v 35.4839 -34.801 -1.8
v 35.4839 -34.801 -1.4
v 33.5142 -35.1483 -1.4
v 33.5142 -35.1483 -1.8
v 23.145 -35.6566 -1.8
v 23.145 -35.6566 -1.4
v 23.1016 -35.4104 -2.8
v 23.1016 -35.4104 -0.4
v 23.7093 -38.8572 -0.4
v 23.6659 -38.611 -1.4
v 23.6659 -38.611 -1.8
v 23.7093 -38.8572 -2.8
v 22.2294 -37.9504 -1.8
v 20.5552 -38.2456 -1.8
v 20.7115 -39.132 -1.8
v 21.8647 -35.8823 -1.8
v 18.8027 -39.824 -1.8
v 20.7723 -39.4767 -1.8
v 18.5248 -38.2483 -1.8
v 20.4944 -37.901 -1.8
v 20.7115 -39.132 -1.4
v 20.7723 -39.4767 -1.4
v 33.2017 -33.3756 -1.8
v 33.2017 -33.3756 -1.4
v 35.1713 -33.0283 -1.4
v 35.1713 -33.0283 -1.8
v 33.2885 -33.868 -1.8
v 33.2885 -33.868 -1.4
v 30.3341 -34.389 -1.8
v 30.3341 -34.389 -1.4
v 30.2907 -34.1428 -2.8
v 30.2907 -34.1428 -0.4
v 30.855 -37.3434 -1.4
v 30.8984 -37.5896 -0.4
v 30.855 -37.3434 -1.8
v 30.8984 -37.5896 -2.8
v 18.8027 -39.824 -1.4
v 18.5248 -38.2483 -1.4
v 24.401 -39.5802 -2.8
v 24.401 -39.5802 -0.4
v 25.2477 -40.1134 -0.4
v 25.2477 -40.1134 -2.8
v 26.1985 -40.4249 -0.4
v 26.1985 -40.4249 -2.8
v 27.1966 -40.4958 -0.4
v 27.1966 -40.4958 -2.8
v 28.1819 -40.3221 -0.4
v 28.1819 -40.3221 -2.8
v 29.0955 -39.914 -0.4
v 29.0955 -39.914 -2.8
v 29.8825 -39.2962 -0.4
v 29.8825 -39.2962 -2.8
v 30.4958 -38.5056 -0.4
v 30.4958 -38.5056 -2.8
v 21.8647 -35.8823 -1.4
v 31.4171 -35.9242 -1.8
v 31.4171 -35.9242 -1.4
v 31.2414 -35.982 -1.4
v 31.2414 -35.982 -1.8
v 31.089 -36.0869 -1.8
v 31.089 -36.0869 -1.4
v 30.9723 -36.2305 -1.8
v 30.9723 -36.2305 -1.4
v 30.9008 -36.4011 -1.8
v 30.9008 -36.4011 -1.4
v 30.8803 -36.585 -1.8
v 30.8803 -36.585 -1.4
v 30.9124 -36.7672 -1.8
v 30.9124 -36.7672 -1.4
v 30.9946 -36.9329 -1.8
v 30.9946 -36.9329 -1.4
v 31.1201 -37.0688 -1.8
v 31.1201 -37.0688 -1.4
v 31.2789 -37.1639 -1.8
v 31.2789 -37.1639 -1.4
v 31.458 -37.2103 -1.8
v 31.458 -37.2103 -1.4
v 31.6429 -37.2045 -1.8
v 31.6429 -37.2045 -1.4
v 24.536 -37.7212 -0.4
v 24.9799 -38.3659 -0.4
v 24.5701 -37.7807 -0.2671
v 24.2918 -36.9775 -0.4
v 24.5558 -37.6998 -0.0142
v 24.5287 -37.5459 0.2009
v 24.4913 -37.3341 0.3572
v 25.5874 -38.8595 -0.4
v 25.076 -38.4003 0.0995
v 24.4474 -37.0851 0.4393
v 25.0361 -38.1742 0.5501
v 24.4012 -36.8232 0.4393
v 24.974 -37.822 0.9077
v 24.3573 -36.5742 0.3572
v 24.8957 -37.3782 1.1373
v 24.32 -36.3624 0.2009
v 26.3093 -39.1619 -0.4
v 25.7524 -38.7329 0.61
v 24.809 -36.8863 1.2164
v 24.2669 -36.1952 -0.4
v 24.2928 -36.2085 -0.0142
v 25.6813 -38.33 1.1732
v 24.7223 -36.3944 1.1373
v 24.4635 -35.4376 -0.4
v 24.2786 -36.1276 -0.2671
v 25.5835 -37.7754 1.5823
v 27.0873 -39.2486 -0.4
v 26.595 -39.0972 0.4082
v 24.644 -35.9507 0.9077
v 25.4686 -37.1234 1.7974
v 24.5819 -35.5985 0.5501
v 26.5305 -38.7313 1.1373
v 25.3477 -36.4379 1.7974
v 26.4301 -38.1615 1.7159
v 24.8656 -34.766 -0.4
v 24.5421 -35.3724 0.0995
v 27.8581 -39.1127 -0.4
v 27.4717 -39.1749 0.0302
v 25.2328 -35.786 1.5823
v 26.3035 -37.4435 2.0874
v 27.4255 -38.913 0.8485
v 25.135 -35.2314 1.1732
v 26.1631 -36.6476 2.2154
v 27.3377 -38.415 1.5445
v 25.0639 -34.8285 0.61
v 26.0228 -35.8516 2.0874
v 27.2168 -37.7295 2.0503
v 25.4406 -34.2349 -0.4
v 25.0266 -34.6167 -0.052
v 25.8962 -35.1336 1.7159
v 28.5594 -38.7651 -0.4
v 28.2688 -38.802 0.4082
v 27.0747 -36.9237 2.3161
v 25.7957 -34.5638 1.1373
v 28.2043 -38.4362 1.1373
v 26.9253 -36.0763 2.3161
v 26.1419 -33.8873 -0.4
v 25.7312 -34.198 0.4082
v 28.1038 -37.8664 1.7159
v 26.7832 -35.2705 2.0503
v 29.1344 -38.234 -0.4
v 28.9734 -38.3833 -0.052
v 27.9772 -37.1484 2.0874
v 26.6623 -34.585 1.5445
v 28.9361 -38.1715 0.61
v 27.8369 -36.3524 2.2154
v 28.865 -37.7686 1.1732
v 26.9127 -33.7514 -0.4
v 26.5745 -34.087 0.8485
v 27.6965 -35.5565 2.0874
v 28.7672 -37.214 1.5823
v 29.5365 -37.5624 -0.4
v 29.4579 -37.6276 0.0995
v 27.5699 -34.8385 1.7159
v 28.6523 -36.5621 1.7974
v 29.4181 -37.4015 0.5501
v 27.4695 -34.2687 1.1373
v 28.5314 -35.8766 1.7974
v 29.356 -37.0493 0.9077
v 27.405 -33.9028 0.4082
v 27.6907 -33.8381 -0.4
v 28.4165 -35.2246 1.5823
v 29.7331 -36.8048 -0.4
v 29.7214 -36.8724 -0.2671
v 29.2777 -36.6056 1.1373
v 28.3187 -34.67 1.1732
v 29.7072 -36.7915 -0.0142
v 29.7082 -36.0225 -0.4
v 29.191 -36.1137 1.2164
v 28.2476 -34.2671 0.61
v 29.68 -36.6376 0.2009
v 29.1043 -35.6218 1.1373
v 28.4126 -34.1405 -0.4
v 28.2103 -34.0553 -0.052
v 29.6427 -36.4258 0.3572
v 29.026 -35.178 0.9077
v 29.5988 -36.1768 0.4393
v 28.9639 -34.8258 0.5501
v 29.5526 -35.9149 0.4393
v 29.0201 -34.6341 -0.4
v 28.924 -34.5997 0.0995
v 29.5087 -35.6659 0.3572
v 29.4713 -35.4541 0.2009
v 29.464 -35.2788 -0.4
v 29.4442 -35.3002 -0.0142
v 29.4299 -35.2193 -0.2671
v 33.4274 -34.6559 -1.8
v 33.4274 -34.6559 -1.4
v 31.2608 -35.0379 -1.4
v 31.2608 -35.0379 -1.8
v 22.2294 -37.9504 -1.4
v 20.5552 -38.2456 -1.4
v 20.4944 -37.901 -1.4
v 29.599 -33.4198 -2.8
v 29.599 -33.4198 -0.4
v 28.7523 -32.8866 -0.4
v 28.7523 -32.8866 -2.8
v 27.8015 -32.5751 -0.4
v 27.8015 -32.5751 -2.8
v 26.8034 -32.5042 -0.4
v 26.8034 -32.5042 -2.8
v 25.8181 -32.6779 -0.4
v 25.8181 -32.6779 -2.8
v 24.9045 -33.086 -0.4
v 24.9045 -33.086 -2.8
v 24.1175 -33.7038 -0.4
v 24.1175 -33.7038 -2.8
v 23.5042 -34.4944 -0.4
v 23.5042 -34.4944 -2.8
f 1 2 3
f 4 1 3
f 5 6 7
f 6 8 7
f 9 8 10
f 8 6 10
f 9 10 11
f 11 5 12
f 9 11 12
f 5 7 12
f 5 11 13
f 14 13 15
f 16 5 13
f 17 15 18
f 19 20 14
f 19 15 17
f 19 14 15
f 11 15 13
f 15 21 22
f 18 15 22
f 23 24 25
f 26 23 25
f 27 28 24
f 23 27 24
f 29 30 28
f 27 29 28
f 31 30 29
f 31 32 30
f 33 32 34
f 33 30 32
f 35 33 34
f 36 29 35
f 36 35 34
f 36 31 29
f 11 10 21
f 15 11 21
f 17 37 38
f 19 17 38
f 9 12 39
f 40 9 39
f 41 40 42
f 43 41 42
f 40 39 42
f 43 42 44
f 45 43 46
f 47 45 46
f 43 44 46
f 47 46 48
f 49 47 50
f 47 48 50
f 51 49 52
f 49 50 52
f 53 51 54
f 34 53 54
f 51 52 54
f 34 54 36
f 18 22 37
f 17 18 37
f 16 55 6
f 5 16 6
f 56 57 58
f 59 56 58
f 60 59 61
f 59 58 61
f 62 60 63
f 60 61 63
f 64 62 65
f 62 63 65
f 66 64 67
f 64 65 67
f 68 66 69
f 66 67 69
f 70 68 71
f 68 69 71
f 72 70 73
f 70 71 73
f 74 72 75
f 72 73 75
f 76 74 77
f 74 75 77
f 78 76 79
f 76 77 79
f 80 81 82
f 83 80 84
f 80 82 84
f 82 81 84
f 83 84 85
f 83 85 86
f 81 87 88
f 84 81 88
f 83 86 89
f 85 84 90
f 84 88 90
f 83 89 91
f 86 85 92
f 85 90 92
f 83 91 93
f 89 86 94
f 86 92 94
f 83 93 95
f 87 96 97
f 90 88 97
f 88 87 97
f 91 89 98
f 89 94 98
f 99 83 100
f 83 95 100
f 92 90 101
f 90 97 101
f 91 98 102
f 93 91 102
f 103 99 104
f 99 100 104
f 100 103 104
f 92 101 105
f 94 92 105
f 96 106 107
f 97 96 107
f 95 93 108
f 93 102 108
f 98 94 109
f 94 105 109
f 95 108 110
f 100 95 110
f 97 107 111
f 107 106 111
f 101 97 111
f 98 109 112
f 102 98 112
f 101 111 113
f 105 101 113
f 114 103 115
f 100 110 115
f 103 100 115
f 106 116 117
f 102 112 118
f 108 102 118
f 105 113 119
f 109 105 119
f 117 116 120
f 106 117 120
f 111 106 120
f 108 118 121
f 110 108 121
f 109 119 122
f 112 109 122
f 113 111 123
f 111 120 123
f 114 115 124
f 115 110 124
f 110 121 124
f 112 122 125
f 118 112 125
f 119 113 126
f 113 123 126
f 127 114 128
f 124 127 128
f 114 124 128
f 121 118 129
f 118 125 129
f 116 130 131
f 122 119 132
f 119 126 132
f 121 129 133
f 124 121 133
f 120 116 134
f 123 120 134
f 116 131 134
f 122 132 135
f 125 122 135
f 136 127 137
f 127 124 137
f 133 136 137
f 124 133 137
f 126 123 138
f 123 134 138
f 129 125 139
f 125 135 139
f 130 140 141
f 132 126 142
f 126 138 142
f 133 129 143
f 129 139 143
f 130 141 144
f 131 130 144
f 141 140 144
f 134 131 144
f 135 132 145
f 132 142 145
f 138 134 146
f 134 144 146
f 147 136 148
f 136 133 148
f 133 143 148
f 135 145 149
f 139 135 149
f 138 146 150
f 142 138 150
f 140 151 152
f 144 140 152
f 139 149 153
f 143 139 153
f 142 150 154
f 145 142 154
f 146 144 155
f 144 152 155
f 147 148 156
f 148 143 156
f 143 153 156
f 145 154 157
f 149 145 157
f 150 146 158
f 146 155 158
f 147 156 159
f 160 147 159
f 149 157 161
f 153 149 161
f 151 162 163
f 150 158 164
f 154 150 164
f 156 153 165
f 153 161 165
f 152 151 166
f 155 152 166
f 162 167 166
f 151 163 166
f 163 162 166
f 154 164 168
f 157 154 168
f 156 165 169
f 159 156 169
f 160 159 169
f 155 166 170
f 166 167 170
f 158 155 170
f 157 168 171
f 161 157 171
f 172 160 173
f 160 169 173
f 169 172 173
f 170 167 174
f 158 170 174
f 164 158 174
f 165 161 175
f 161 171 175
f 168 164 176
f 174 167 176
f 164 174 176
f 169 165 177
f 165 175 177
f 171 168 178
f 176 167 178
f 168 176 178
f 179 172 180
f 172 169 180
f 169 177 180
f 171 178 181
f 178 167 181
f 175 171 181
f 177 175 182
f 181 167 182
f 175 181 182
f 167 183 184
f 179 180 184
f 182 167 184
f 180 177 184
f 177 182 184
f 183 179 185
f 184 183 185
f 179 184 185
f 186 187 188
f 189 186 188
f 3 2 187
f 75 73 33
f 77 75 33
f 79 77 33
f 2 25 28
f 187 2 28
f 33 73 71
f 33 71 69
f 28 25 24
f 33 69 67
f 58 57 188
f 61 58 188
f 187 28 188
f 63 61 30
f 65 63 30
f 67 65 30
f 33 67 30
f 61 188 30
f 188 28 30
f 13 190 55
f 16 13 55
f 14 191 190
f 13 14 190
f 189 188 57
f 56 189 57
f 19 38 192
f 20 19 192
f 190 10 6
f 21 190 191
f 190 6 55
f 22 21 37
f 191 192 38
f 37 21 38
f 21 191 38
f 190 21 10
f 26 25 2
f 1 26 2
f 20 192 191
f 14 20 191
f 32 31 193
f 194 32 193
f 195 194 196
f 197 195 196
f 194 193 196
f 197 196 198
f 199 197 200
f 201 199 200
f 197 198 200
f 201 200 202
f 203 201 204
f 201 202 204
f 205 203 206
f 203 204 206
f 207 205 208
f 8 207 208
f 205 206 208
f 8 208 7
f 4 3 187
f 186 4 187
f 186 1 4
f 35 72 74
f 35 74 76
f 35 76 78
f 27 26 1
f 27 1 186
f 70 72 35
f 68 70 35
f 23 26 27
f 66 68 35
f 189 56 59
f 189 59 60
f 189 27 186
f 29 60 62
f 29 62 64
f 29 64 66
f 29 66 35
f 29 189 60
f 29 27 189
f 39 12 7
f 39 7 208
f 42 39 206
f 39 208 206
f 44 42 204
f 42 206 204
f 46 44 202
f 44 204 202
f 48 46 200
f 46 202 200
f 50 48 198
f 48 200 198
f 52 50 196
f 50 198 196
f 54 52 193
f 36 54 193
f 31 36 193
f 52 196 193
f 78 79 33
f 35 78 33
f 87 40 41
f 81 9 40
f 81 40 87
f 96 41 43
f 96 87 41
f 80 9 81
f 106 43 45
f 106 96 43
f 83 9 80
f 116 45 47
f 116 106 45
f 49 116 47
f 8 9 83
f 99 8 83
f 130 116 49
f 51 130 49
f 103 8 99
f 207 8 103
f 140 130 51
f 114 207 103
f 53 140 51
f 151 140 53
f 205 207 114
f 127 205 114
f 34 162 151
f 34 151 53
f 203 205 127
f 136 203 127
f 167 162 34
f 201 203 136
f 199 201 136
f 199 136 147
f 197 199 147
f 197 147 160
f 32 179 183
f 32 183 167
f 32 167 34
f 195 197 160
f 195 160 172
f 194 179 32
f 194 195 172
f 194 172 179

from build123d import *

# Parameters (mm, degrees)
REVOLUTION003_ANGLE       = -180
PAD019_DEPTH              = 0.4
BODY018_PLACEMENT_ANGLE   = 180
PAD018_DEPTH              = 2.4
FUSION004_PLACEMENT_ANGLE = 10


with BuildPart() as light003:
    # Sketch030 (on Face1 of ShapeBinder007) → Revolution003 (revolve)
    with BuildSketch(Plane.XY.offset(2.4)):
        with BuildLine():
            ThreePointArc((-2.75, 0), (0, -2.75), (2.75, 0))
            Line((-2.75, 0), (2.75, 0))
        make_face()
    revolve(axis=Axis((-2.75, 0, 2.4), (1, 0, 0)), revolution_arc=REVOLUTION003_ANGLE)


with BuildPart() as body018:
    # Sketch031 (on Face1 of ShapeBinder008) → Pad019 (new body)
    with BuildSketch(Plane(origin=(0, 0, 0), x_dir=(1, 0, 0), z_dir=(0, 0, -1))):
        with BuildLine():
            Line((3.65, 1.5), (6.65, 1.5))
            Line((6.65, 1.5), (6.65, 2))
            Line((6.65, 2), (8.65, 2))
            Line((8.65, 2), (8.65, 0.2))
            Line((8.65, 0.2), (6.65, 0.2))
            Line((6.65, 0.2), (6.65, 0.7))
            Line((6.65, 0.7), (4.45, 0.7))
            Line((4.45, 0.7), (4.45, -0.2))
            ThreePointArc((4.45, -0.2), (3.8, -0.85), (4.45, -1.5))
            Line((4.45, -1.5), (-6.65, -1.5))
            Line((-6.65, -1.5), (-6.65, -1.85))
            Line((-6.65, -1.85), (-8.65, -1.85))
            Line((-8.65, -1.85), (-8.65, -0.25))
            Line((-8.65, -0.25), (-6.65, -0.25))
            Line((-6.65, -0.25), (-6.65, -0.6))
            Line((-6.65, -0.6), (-4.95, -0.6))
            Line((-4.95, -0.6), (-4.95, 1.5))
            Line((-4.95, 1.5), (3.65, 1.5))
        make_face()
    extrude(amount=-PAD019_DEPTH)


with BuildPart() as body018_1:
    # Body018 placement: moved
    add(body018.part.moved(Location((0, 0, 1.4))).rotate(Axis((0, 0, 1.4), (1, 0, 0)), BODY018_PLACEMENT_ANGLE))


with BuildPart() as led4:
    # Sketch029 → Pad018 (new body)
    with BuildSketch(Plane.XY):
        with BuildLine():
            Line((-3.65, 1.75), (-3.65, -1.75))
            ThreePointArc((-3.65, -1.75), (0, -4), (3.65, -1.75))
            Line((3.65, 1.75), (3.65, -1.75))
            ThreePointArc((3.65, 1.75), (0, 4), (-3.65, 1.75))
        make_face()
    extrude(amount=PAD018_DEPTH)

    # Fusion004: union light003, Body018
    add(light003.part)
    add(body018_1.part)


with BuildPart() as led4_1:
    # Fusion004 placement: moved
    add(led4.part.moved(Location((27, -36.5, -2.8))).rotate(Axis((27, -36.5, -2.8), (0, 0, 1)), FUSION004_PLACEMENT_ANGLE))


solid = led4_1.part
